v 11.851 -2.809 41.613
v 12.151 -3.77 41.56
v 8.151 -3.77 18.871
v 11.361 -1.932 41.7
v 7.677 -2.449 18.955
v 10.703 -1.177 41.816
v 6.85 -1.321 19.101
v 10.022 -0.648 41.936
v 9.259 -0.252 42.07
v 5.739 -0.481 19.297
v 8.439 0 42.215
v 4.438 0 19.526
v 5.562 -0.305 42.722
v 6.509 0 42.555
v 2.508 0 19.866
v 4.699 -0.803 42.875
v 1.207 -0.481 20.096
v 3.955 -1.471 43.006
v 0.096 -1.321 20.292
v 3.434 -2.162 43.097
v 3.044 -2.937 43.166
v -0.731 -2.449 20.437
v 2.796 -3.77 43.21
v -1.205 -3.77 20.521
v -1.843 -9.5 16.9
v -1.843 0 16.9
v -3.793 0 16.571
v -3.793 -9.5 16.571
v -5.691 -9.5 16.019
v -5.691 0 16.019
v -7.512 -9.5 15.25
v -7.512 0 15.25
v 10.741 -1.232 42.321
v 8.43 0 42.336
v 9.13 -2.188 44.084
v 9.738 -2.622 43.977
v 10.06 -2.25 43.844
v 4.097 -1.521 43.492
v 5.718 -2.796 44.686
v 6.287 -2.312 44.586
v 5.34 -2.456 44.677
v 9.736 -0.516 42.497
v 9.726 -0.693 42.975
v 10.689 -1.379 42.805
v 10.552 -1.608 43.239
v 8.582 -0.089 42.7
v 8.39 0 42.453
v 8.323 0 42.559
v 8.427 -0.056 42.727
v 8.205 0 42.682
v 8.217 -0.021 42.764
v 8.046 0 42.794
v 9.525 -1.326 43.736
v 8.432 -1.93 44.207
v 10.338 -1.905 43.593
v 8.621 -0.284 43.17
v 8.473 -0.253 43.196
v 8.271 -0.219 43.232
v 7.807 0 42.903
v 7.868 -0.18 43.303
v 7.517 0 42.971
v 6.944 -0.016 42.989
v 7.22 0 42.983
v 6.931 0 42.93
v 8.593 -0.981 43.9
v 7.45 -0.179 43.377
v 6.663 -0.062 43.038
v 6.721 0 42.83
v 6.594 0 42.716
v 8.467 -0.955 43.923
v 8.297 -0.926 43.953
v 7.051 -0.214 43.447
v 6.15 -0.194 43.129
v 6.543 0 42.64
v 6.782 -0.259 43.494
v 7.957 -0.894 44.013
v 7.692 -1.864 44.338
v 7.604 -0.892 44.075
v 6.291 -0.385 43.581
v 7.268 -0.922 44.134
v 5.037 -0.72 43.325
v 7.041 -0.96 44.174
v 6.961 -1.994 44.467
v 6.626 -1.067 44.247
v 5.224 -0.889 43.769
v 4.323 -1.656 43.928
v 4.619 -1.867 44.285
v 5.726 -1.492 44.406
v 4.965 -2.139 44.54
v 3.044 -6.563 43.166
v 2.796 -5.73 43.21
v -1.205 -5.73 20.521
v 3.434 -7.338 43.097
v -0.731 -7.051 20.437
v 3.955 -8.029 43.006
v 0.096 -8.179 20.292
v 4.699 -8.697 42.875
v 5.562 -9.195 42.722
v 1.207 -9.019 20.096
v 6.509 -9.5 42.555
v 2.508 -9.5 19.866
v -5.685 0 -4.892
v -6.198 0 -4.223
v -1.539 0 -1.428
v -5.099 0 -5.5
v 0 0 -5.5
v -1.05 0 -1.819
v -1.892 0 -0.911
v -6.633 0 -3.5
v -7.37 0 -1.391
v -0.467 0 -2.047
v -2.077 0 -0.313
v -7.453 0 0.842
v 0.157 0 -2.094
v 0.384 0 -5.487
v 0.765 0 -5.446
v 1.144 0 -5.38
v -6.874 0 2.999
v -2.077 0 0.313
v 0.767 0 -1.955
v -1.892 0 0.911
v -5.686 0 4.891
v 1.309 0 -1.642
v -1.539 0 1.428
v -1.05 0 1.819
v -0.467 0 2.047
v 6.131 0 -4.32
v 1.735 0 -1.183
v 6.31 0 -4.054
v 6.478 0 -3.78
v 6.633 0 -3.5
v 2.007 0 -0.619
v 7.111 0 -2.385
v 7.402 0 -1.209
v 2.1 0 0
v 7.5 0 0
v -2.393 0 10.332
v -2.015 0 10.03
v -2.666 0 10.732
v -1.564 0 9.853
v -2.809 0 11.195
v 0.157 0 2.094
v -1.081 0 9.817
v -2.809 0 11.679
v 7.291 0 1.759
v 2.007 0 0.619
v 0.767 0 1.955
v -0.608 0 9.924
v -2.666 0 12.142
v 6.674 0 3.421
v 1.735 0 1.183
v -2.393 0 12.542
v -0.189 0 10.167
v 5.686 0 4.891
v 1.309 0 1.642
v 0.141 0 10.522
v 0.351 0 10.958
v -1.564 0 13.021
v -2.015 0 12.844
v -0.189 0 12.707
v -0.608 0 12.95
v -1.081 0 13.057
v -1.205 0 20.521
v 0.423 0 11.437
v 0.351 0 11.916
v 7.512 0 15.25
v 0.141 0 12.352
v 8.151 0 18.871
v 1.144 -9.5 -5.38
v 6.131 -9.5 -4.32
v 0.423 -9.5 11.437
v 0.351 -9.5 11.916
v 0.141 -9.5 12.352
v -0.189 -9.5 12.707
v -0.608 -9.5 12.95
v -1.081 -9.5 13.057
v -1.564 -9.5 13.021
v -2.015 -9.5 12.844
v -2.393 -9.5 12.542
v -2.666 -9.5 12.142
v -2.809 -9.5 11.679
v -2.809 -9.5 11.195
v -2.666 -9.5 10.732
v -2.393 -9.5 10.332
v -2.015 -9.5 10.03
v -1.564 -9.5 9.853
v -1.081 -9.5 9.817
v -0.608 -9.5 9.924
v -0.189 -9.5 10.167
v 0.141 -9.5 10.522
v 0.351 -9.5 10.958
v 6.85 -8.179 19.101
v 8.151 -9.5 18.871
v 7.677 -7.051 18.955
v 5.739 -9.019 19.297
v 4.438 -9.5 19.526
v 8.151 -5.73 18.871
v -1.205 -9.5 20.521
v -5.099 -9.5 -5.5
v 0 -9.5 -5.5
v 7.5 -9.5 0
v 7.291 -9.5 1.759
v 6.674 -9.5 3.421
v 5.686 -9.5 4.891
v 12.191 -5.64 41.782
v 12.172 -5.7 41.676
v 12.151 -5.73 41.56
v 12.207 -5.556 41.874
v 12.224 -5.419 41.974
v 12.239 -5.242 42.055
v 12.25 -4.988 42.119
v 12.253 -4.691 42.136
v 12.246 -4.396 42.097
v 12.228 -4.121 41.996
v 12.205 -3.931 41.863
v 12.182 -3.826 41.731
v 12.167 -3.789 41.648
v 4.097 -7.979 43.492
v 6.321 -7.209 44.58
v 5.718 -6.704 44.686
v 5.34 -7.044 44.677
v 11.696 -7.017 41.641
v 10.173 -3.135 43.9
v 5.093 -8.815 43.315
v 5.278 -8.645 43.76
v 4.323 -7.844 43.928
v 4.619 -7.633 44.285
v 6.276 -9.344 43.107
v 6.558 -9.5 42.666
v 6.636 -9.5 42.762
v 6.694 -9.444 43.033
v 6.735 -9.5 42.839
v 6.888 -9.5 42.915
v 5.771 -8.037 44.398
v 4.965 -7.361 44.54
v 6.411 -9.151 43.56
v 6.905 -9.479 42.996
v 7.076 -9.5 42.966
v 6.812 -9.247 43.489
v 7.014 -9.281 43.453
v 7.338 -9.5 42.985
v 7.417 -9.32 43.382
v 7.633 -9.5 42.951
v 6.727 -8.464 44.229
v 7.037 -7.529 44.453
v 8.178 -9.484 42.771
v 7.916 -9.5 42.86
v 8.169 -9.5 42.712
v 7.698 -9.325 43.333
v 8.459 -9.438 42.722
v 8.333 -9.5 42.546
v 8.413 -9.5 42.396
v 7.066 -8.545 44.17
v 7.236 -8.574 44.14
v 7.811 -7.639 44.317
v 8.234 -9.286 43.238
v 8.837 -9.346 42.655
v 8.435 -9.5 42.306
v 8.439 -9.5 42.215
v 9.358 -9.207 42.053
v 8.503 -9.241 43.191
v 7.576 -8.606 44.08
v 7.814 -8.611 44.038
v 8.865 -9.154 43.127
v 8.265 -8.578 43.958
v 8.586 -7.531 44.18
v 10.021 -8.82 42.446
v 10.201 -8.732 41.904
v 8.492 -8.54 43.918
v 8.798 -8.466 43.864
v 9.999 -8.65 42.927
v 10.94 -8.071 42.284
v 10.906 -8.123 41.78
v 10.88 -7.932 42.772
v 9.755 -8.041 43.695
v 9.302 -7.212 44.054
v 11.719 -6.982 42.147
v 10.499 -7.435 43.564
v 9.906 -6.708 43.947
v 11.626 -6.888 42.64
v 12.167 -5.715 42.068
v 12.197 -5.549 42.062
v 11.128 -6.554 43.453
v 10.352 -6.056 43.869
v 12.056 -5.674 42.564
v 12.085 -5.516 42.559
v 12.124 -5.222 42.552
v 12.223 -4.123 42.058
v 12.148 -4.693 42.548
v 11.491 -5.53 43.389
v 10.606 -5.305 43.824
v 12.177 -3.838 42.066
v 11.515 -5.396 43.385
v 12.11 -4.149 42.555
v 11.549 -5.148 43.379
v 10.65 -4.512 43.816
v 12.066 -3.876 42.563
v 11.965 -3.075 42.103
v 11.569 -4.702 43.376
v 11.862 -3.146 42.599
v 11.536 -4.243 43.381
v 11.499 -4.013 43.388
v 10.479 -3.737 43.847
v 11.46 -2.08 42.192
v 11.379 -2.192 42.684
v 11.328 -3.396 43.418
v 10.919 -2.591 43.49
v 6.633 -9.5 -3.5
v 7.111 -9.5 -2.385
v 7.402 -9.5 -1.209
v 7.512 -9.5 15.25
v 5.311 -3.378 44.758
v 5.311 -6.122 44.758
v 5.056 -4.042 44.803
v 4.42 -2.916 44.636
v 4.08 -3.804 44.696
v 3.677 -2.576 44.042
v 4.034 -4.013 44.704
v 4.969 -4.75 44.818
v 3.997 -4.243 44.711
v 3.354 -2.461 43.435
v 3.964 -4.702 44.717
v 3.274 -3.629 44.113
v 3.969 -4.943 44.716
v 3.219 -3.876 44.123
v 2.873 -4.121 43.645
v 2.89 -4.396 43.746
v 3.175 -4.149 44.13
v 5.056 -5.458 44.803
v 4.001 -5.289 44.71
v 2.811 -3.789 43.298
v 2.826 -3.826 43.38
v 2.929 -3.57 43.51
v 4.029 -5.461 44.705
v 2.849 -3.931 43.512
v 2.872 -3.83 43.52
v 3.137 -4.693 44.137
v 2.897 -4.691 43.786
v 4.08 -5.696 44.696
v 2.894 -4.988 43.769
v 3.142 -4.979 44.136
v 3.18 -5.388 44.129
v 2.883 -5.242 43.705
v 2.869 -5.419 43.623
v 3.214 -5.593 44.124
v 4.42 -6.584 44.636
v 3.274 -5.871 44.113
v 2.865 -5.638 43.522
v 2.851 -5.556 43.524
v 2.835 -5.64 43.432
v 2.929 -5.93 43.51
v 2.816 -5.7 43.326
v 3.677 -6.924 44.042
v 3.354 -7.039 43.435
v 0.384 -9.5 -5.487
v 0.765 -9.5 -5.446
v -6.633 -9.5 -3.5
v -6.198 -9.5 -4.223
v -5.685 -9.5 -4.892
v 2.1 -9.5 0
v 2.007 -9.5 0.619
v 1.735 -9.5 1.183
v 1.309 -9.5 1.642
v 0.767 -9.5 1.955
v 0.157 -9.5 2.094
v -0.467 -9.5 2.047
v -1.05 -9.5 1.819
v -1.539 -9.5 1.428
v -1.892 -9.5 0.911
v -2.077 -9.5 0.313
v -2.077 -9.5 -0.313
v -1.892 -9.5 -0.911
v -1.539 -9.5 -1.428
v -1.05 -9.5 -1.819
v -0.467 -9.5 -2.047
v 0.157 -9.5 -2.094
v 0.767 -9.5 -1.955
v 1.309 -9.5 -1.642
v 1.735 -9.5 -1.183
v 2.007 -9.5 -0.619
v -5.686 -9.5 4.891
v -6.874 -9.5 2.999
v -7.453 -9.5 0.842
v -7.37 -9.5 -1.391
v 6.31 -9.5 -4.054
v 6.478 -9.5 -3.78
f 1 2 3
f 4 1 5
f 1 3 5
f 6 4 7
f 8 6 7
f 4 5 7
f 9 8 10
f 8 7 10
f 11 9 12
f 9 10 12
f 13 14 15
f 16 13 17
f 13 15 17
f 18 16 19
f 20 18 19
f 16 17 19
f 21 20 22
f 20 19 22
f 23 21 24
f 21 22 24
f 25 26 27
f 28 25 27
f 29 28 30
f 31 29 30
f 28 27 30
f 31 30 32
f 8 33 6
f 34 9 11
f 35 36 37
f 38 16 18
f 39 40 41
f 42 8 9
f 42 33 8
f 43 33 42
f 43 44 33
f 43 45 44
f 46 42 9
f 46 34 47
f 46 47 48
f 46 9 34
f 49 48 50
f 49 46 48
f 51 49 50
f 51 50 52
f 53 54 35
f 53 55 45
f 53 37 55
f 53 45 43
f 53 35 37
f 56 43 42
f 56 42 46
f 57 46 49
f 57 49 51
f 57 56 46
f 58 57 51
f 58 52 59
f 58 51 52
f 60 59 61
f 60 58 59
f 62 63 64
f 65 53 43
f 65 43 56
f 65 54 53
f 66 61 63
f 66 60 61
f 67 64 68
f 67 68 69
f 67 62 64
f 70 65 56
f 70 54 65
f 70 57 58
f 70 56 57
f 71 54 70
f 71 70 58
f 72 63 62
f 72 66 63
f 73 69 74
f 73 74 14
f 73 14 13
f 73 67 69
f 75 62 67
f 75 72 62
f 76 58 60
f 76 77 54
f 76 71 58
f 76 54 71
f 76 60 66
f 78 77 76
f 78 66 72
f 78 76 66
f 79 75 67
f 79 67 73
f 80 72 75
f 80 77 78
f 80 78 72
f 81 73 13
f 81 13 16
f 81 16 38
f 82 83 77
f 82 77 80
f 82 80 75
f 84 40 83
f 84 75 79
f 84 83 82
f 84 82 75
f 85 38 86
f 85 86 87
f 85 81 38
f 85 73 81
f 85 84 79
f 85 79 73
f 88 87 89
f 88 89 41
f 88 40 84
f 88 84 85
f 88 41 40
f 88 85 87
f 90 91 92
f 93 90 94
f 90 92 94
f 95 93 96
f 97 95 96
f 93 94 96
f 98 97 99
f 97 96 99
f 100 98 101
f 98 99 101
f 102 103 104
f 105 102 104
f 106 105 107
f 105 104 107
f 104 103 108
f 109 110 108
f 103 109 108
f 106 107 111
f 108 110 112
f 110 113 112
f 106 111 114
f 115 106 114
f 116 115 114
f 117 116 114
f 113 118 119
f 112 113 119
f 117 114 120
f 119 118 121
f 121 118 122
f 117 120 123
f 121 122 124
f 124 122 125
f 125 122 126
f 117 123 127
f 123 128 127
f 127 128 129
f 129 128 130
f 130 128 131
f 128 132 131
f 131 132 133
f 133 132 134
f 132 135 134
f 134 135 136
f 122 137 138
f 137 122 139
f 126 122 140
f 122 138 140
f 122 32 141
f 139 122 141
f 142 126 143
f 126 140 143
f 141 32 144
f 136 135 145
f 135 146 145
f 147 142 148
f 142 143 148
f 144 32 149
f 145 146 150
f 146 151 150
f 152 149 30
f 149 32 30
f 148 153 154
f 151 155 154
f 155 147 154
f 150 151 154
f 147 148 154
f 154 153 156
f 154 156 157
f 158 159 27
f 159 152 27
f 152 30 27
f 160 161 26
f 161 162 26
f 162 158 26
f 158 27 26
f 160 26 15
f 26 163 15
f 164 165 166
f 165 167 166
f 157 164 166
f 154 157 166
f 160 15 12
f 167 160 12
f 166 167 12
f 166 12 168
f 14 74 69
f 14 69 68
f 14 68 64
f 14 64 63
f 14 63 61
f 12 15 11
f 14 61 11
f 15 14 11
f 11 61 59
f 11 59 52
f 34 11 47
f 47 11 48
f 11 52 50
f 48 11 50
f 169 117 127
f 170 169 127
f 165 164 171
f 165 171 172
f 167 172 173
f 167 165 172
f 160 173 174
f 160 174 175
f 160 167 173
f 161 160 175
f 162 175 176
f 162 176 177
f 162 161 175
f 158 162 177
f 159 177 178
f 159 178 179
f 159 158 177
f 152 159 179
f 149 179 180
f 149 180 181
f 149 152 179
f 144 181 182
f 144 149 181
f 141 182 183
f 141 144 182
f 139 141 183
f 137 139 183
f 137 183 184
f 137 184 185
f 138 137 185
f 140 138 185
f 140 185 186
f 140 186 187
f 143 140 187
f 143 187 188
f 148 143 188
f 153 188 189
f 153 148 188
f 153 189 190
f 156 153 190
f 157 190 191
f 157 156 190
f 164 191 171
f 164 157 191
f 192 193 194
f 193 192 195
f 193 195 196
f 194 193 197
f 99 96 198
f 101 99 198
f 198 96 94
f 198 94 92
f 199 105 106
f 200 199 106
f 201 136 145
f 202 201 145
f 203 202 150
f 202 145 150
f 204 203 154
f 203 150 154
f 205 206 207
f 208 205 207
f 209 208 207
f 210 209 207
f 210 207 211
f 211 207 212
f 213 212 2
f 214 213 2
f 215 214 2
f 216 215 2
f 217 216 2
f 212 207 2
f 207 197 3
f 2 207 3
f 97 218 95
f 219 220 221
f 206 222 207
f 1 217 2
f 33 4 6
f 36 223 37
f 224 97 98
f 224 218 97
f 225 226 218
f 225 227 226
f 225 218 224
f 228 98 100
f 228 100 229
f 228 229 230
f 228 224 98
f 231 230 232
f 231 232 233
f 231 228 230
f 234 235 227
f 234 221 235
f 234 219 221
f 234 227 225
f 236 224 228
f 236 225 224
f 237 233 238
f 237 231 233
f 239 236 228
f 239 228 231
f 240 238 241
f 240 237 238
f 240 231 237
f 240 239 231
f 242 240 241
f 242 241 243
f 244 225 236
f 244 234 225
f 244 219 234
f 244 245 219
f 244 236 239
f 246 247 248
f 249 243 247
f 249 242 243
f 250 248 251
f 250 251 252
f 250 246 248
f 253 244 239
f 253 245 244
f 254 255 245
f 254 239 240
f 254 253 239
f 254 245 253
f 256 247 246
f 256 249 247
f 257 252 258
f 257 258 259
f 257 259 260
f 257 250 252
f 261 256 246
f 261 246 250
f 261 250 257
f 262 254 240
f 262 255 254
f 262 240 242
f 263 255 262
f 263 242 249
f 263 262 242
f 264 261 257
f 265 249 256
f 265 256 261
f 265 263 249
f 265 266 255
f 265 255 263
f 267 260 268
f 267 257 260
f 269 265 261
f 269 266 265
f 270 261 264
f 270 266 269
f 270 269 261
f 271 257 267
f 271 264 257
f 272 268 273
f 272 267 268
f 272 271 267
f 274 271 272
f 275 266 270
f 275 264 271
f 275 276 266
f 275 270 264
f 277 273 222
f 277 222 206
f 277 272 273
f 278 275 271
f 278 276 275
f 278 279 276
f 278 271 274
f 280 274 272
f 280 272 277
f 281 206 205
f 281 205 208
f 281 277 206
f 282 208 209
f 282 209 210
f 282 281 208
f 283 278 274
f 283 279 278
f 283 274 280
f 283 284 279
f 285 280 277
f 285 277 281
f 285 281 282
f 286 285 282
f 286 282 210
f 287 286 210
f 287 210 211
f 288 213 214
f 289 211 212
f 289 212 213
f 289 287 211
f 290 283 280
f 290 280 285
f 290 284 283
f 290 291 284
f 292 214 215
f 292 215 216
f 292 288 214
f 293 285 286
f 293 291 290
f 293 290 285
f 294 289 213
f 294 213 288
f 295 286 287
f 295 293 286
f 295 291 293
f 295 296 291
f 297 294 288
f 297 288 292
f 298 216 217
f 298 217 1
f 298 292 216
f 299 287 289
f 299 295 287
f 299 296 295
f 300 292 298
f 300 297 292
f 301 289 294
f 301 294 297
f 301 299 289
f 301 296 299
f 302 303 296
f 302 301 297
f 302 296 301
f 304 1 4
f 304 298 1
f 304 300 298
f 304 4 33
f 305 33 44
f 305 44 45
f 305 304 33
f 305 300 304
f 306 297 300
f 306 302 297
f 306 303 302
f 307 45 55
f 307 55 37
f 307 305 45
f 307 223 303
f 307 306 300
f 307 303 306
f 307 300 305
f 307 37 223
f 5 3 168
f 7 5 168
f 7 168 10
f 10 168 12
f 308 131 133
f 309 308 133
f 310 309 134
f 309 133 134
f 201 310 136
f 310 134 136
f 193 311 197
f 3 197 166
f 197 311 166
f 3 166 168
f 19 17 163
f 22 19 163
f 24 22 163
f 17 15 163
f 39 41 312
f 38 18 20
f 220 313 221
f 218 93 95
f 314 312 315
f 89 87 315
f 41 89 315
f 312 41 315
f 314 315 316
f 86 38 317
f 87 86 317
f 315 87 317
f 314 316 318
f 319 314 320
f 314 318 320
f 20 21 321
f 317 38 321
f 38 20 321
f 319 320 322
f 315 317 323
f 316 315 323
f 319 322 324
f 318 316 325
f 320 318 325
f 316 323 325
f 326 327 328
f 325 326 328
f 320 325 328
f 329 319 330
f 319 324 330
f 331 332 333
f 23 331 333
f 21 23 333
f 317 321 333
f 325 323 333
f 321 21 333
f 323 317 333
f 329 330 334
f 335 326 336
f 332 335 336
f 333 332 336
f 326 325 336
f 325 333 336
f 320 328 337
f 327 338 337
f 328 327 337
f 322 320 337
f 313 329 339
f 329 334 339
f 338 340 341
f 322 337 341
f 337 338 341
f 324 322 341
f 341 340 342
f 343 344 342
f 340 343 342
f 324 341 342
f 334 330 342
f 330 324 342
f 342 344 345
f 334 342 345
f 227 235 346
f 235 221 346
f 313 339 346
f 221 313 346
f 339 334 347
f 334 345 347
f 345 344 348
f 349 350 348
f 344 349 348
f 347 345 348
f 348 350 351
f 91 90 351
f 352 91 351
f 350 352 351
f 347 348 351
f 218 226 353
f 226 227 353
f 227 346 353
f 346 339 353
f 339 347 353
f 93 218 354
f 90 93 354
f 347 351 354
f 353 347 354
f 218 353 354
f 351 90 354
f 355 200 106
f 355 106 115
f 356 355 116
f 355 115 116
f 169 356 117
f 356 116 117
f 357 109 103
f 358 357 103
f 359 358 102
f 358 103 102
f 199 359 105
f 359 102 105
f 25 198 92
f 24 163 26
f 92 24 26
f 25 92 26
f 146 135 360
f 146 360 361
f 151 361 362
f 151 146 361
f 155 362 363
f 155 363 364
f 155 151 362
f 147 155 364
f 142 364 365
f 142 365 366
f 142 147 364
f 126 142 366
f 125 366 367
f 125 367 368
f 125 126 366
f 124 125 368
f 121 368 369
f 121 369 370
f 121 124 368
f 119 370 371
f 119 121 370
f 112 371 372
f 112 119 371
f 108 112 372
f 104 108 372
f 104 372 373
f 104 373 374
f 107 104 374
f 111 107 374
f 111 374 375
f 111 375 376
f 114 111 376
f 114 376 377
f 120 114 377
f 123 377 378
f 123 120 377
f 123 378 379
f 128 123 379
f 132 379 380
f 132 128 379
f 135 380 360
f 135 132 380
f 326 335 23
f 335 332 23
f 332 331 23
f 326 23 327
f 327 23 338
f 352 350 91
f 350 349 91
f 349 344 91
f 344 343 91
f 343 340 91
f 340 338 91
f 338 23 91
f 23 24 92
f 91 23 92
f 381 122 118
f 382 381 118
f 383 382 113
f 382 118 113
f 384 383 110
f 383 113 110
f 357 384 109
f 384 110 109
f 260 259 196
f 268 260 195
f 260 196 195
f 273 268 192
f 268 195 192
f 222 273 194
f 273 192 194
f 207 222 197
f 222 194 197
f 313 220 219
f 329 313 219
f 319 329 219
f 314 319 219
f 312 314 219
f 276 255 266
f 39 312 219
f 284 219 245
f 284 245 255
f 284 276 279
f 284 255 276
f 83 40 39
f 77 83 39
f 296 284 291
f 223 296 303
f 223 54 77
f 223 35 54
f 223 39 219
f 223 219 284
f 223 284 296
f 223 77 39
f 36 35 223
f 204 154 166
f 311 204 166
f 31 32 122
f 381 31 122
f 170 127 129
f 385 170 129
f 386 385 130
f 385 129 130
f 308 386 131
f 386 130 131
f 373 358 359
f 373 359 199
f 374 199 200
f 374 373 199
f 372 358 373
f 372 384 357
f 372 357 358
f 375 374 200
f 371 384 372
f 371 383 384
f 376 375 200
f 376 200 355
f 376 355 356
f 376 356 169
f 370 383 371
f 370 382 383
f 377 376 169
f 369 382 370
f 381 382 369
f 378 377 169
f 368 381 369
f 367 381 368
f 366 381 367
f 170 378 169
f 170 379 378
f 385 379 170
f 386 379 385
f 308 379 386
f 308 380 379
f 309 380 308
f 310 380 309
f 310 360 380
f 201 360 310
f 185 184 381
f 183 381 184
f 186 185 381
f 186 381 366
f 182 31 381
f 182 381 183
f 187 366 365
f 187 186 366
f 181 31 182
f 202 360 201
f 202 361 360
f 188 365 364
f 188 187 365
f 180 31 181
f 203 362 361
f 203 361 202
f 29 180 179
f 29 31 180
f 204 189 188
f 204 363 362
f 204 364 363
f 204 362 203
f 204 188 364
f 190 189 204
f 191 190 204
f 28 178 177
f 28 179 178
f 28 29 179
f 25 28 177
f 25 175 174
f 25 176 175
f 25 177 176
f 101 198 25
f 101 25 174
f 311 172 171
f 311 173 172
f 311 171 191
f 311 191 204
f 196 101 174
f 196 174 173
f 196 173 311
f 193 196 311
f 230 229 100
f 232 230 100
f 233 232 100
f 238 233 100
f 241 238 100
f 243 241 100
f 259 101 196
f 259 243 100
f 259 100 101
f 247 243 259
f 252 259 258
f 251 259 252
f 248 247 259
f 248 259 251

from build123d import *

# Parameters (mm, degrees)
F0_R        = 1.625
F0_R_2      = 2.1
F1_DEPTH    = 9.5
F3_DEPTH    = 25
F4_T2_ANGLE = 184.9085480034
F4_T4_ANGLE = 184.9085480034
F4_T6_ANGLE = 184.9085480034
F4_T8_ANGLE = 184.9085480034


# Not quite as in the source:
# - a fillet or chamfer that OpenCascade refuses, or shapes differently, is made with other operations: its cross-section is extruded or revolved along the edge and cut away or added
# - a feature names something its author has since deleted; it is built from what else it names


with BuildPart() as f1:
    # F0 (on Front) → F1 (new body)
    with BuildSketch(Plane.XZ):
        with BuildLine():
            Line((-7.512280983, 15.2501027679), (-5.6857070658, 4.891087319))
            ThreePointArc((-5.6857070658, 4.891087319), (0, 7.5), (5.6857070658, 4.891087319))
            Line((5.6857070658, 4.891087319), (7.512280983, 15.2501027679))
            Line((7.512280983, 15.2501027679), (8.1508003801, 18.8713262163))
            Line((8.1508003801, 18.8713262163), (-1.2048732735, 20.5209839042))
            Line((-1.2048732735, 20.5209839042), (-1.8433926706, 16.8997604558))
            ThreePointArc((-1.8433926706, 16.8997604558), (-4.75, 16.3229133429), (-7.512280983, 15.2501027679))
        make_face()
        with Locations((-1.2020773276, 11.4370017967)):
            Circle(F0_R, mode=Mode.SUBTRACT)
        with BuildLine():
            ThreePointArc((-5.6857070658, 4.891087319), (-7.452634421, 0.8415700723), (-6.6332495807, -3.5))
            Line((-6.6332495807, -3.5), (6.6332495807, -3.5))
            ThreePointArc((6.6332495807, -3.5), (7.2800883187, -1.8028627436), (7.5, 0))
            ThreePointArc((7.5, 0), (7.0318135283, 2.6083708523), (5.6857070658, 4.891087319))
            ThreePointArc((5.6857070658, 4.891087319), (0, 7.5), (-5.6857070658, 4.891087319))
        make_face()
        Circle(F0_R_2, mode=Mode.SUBTRACT)
        with BuildLine():
            ThreePointArc((-6.6332495807, -3.5), (-5.9507591554, -4.5649168092), (-5.0990195136, -5.5))
            Line((-5.0990195136, -5.5), (0, -5.5))
            ThreePointArc((0, -5.5), (0.574906548, -5.4698704245), (1.1435142995, -5.379811804))
            Line((1.1435142995, -5.379811804), (6.1311080028, -4.3196660355))
            ThreePointArc((6.1311080028, -4.3196660355), (6.3953240131, -3.9178860075), (6.6332495807, -3.5))
            Line((6.6332495807, -3.5), (-6.6332495807, -3.5))
        make_face()
    extrude(amount=F1_DEPTH)

    # F2 (on face) → F3 (join)
    with BuildSketch(Plane(origin=(3.4729635533, 0, 19.6961550602), x_dir=(0.984807753, 0, -0.1736481777), z_dir=(0.1736481777, 0, 0.984807753))):
        with BuildLine():
            Line((4.75, -5.7297958971), (4.75, -3.7702041029))
            ThreePointArc((4.75, -3.7702041029), (3.4294678888, -1.3205321112), (0.9797958971, 0))
            Line((0.9797958971, 0), (-0.9797958971, 0))
            ThreePointArc((-0.9797958971, 0), (-3.4294678888, -1.3205321112), (-4.75, -3.7702041029))
            Line((-4.75, -3.7702041029), (-4.75, -5.7297958971))
            ThreePointArc((-4.75, -5.7297958971), (-3.4294678888, -8.1794678888), (-0.9797958971, -9.5))
            Line((-0.9797958971, -9.5), (0.9797958971, -9.5))
            ThreePointArc((0.9797958971, -9.5), (3.4294678888, -8.1794678888), (4.75, -5.7297958971))
        make_face()
    extrude(amount=F3_DEPTH)

    # F4: fillet of radius 2 on 4 edges, made by hand

    # F4_s1 → F4_t2 (revolve, cut)
    with BuildSketch(Plane(origin=(2.3303405276, -2.5782182234, -0.4109019093), x_dir=(-0.7418696826, -0.6705440881, 0), z_dir=(-0.6659057216, 0.7367379343, 0.1174171453))):
        with BuildLine():
            ThreePointArc((2.4557468395, 43.6793554426), (1.6921353384, 45.0072275442), (0.2132331001, 45.4062200412))
            Line((0.2132331001, 45.4062200412), (0.187450643, 45.6046889581))
            ThreePointArc((0.187450643, 45.6046889581), (1.1796484238, 45.7331788115), (2.1717946748, 45.8620653318))
            Line((2.1717946748, 45.8620653318), (2.3960460488, 45.6893788719))
            ThreePointArc((2.3960460488, 45.6893788719), (2.5249325691, 44.6972326209), (2.6542157564, 43.7051378996))
            Line((2.6542157564, 43.7051378996), (2.4557468395, 43.6793554426))
        make_face()
    revolve(axis=Axis((7.814167995, -4.75, 44.3163488855), (0.1736481777, 0, 0.984807753)), revolution_arc=F4_T2_ANGLE, mode=Mode.SUBTRACT)

    # F4_s3 → F4_t4 (revolve, cut)
    with BuildSketch(Plane(origin=(-2.3303405276, -2.1717817766, 0.4109019093), x_dir=(0.6817807283, -0.731556586, 0), z_dir=(-0.7255452297, -0.6761783908, 0.1279331997))):
        with BuildLine():
            ThreePointArc((13.3818366305, 41.7080845524), (12.9673157833, 43.1827096947), (11.6314878435, 43.9323166305))
            Line((11.6314878435, 43.9323166305), (11.655182008, 44.1310456738))
            ThreePointArc((11.655182008, 44.1310456738), (12.6485812749, 44.0122013421), (13.6420278977, 43.8937541973))
            Line((13.6420278977, 43.8937541973), (13.8170627765, 43.6713309895))
            ThreePointArc((13.8170627765, 43.6713309895), (13.6986156317, 42.6778843667), (13.5805656738, 41.6843903878))
            Line((13.5805656738, 41.6843903878), (13.3818366305, 41.7080845524))
        make_face()
    revolve(axis=Axis((7.814167995, -4.75, 44.3163488855), (0.1736481777, 0, 0.984807753)), revolution_arc=F4_T4_ANGLE, mode=Mode.SUBTRACT)

    # F4_s5 → F4_t6 (revolve, cut)
    with BuildSketch(Plane(origin=(2.3303405276, -2.5782182234, -0.4109019093), x_dir=(0.7418696826, 0.6705440881, 0), z_dir=(0.6659057216, -0.7367379343, -0.1174171453))):
        with BuildLine():
            ThreePointArc((5.4373559827, 44.6721702336), (6.7652280844, 43.9085587325), (7.1642205814, 42.4296564942))
            Line((7.1642205814, 42.4296564942), (7.3626894983, 42.4038740371))
            ThreePointArc((7.3626894983, 42.4038740371), (7.4911793516, 43.3960718179), (7.6200658719, 44.3882180689))
            Line((7.6200658719, 44.3882180689), (7.4473794121, 44.6124694429))
            ThreePointArc((7.4473794121, 44.6124694429), (6.455233161, 44.7413559632), (5.4631384397, 44.8706391505))
            Line((5.4631384397, 44.8706391505), (5.4373559827, 44.6721702336))
        make_face()
    revolve(axis=Axis((7.814167995, -4.75, 44.3163488855), (0.1736481777, 0, 0.984807753)), revolution_arc=F4_T6_ANGLE, mode=Mode.SUBTRACT)

    # F4_s7 → F4_t8 (revolve, cut)
    with BuildSketch(Plane(origin=(-2.3303405276, -2.1717817766, 0.4109019093), x_dir=(-0.6817807283, 0.731556586, 0), z_dir=(0.7255452297, 0.6761783908, -0.1279331997))):
        with BuildLine():
            ThreePointArc((-5.9734927288, 44.6069108674), (-4.4988675865, 44.1923900202), (-3.7492606507, 42.8565620804))
            Line((-3.7492606507, 42.8565620804), (-3.5505316074, 42.880256245))
            ThreePointArc((-3.5505316074, 42.880256245), (-3.669375939, 43.8736555118), (-3.7878230838, 44.8671021347))
            Line((-3.7878230838, 44.8671021347), (-4.0102462916, 45.0421370134))
            ThreePointArc((-4.0102462916, 45.0421370134), (-5.0036929145, 44.9236898686), (-5.9971868933, 44.8056399107))
            Line((-5.9971868933, 44.8056399107), (-5.9734927288, 44.6069108674))
        make_face()
    revolve(axis=Axis((7.814167995, -4.75, 44.3163488855), (0.1736481777, 0, 0.984807753)), revolution_arc=F4_T8_ANGLE, mode=Mode.SUBTRACT)


solid = f1.part
